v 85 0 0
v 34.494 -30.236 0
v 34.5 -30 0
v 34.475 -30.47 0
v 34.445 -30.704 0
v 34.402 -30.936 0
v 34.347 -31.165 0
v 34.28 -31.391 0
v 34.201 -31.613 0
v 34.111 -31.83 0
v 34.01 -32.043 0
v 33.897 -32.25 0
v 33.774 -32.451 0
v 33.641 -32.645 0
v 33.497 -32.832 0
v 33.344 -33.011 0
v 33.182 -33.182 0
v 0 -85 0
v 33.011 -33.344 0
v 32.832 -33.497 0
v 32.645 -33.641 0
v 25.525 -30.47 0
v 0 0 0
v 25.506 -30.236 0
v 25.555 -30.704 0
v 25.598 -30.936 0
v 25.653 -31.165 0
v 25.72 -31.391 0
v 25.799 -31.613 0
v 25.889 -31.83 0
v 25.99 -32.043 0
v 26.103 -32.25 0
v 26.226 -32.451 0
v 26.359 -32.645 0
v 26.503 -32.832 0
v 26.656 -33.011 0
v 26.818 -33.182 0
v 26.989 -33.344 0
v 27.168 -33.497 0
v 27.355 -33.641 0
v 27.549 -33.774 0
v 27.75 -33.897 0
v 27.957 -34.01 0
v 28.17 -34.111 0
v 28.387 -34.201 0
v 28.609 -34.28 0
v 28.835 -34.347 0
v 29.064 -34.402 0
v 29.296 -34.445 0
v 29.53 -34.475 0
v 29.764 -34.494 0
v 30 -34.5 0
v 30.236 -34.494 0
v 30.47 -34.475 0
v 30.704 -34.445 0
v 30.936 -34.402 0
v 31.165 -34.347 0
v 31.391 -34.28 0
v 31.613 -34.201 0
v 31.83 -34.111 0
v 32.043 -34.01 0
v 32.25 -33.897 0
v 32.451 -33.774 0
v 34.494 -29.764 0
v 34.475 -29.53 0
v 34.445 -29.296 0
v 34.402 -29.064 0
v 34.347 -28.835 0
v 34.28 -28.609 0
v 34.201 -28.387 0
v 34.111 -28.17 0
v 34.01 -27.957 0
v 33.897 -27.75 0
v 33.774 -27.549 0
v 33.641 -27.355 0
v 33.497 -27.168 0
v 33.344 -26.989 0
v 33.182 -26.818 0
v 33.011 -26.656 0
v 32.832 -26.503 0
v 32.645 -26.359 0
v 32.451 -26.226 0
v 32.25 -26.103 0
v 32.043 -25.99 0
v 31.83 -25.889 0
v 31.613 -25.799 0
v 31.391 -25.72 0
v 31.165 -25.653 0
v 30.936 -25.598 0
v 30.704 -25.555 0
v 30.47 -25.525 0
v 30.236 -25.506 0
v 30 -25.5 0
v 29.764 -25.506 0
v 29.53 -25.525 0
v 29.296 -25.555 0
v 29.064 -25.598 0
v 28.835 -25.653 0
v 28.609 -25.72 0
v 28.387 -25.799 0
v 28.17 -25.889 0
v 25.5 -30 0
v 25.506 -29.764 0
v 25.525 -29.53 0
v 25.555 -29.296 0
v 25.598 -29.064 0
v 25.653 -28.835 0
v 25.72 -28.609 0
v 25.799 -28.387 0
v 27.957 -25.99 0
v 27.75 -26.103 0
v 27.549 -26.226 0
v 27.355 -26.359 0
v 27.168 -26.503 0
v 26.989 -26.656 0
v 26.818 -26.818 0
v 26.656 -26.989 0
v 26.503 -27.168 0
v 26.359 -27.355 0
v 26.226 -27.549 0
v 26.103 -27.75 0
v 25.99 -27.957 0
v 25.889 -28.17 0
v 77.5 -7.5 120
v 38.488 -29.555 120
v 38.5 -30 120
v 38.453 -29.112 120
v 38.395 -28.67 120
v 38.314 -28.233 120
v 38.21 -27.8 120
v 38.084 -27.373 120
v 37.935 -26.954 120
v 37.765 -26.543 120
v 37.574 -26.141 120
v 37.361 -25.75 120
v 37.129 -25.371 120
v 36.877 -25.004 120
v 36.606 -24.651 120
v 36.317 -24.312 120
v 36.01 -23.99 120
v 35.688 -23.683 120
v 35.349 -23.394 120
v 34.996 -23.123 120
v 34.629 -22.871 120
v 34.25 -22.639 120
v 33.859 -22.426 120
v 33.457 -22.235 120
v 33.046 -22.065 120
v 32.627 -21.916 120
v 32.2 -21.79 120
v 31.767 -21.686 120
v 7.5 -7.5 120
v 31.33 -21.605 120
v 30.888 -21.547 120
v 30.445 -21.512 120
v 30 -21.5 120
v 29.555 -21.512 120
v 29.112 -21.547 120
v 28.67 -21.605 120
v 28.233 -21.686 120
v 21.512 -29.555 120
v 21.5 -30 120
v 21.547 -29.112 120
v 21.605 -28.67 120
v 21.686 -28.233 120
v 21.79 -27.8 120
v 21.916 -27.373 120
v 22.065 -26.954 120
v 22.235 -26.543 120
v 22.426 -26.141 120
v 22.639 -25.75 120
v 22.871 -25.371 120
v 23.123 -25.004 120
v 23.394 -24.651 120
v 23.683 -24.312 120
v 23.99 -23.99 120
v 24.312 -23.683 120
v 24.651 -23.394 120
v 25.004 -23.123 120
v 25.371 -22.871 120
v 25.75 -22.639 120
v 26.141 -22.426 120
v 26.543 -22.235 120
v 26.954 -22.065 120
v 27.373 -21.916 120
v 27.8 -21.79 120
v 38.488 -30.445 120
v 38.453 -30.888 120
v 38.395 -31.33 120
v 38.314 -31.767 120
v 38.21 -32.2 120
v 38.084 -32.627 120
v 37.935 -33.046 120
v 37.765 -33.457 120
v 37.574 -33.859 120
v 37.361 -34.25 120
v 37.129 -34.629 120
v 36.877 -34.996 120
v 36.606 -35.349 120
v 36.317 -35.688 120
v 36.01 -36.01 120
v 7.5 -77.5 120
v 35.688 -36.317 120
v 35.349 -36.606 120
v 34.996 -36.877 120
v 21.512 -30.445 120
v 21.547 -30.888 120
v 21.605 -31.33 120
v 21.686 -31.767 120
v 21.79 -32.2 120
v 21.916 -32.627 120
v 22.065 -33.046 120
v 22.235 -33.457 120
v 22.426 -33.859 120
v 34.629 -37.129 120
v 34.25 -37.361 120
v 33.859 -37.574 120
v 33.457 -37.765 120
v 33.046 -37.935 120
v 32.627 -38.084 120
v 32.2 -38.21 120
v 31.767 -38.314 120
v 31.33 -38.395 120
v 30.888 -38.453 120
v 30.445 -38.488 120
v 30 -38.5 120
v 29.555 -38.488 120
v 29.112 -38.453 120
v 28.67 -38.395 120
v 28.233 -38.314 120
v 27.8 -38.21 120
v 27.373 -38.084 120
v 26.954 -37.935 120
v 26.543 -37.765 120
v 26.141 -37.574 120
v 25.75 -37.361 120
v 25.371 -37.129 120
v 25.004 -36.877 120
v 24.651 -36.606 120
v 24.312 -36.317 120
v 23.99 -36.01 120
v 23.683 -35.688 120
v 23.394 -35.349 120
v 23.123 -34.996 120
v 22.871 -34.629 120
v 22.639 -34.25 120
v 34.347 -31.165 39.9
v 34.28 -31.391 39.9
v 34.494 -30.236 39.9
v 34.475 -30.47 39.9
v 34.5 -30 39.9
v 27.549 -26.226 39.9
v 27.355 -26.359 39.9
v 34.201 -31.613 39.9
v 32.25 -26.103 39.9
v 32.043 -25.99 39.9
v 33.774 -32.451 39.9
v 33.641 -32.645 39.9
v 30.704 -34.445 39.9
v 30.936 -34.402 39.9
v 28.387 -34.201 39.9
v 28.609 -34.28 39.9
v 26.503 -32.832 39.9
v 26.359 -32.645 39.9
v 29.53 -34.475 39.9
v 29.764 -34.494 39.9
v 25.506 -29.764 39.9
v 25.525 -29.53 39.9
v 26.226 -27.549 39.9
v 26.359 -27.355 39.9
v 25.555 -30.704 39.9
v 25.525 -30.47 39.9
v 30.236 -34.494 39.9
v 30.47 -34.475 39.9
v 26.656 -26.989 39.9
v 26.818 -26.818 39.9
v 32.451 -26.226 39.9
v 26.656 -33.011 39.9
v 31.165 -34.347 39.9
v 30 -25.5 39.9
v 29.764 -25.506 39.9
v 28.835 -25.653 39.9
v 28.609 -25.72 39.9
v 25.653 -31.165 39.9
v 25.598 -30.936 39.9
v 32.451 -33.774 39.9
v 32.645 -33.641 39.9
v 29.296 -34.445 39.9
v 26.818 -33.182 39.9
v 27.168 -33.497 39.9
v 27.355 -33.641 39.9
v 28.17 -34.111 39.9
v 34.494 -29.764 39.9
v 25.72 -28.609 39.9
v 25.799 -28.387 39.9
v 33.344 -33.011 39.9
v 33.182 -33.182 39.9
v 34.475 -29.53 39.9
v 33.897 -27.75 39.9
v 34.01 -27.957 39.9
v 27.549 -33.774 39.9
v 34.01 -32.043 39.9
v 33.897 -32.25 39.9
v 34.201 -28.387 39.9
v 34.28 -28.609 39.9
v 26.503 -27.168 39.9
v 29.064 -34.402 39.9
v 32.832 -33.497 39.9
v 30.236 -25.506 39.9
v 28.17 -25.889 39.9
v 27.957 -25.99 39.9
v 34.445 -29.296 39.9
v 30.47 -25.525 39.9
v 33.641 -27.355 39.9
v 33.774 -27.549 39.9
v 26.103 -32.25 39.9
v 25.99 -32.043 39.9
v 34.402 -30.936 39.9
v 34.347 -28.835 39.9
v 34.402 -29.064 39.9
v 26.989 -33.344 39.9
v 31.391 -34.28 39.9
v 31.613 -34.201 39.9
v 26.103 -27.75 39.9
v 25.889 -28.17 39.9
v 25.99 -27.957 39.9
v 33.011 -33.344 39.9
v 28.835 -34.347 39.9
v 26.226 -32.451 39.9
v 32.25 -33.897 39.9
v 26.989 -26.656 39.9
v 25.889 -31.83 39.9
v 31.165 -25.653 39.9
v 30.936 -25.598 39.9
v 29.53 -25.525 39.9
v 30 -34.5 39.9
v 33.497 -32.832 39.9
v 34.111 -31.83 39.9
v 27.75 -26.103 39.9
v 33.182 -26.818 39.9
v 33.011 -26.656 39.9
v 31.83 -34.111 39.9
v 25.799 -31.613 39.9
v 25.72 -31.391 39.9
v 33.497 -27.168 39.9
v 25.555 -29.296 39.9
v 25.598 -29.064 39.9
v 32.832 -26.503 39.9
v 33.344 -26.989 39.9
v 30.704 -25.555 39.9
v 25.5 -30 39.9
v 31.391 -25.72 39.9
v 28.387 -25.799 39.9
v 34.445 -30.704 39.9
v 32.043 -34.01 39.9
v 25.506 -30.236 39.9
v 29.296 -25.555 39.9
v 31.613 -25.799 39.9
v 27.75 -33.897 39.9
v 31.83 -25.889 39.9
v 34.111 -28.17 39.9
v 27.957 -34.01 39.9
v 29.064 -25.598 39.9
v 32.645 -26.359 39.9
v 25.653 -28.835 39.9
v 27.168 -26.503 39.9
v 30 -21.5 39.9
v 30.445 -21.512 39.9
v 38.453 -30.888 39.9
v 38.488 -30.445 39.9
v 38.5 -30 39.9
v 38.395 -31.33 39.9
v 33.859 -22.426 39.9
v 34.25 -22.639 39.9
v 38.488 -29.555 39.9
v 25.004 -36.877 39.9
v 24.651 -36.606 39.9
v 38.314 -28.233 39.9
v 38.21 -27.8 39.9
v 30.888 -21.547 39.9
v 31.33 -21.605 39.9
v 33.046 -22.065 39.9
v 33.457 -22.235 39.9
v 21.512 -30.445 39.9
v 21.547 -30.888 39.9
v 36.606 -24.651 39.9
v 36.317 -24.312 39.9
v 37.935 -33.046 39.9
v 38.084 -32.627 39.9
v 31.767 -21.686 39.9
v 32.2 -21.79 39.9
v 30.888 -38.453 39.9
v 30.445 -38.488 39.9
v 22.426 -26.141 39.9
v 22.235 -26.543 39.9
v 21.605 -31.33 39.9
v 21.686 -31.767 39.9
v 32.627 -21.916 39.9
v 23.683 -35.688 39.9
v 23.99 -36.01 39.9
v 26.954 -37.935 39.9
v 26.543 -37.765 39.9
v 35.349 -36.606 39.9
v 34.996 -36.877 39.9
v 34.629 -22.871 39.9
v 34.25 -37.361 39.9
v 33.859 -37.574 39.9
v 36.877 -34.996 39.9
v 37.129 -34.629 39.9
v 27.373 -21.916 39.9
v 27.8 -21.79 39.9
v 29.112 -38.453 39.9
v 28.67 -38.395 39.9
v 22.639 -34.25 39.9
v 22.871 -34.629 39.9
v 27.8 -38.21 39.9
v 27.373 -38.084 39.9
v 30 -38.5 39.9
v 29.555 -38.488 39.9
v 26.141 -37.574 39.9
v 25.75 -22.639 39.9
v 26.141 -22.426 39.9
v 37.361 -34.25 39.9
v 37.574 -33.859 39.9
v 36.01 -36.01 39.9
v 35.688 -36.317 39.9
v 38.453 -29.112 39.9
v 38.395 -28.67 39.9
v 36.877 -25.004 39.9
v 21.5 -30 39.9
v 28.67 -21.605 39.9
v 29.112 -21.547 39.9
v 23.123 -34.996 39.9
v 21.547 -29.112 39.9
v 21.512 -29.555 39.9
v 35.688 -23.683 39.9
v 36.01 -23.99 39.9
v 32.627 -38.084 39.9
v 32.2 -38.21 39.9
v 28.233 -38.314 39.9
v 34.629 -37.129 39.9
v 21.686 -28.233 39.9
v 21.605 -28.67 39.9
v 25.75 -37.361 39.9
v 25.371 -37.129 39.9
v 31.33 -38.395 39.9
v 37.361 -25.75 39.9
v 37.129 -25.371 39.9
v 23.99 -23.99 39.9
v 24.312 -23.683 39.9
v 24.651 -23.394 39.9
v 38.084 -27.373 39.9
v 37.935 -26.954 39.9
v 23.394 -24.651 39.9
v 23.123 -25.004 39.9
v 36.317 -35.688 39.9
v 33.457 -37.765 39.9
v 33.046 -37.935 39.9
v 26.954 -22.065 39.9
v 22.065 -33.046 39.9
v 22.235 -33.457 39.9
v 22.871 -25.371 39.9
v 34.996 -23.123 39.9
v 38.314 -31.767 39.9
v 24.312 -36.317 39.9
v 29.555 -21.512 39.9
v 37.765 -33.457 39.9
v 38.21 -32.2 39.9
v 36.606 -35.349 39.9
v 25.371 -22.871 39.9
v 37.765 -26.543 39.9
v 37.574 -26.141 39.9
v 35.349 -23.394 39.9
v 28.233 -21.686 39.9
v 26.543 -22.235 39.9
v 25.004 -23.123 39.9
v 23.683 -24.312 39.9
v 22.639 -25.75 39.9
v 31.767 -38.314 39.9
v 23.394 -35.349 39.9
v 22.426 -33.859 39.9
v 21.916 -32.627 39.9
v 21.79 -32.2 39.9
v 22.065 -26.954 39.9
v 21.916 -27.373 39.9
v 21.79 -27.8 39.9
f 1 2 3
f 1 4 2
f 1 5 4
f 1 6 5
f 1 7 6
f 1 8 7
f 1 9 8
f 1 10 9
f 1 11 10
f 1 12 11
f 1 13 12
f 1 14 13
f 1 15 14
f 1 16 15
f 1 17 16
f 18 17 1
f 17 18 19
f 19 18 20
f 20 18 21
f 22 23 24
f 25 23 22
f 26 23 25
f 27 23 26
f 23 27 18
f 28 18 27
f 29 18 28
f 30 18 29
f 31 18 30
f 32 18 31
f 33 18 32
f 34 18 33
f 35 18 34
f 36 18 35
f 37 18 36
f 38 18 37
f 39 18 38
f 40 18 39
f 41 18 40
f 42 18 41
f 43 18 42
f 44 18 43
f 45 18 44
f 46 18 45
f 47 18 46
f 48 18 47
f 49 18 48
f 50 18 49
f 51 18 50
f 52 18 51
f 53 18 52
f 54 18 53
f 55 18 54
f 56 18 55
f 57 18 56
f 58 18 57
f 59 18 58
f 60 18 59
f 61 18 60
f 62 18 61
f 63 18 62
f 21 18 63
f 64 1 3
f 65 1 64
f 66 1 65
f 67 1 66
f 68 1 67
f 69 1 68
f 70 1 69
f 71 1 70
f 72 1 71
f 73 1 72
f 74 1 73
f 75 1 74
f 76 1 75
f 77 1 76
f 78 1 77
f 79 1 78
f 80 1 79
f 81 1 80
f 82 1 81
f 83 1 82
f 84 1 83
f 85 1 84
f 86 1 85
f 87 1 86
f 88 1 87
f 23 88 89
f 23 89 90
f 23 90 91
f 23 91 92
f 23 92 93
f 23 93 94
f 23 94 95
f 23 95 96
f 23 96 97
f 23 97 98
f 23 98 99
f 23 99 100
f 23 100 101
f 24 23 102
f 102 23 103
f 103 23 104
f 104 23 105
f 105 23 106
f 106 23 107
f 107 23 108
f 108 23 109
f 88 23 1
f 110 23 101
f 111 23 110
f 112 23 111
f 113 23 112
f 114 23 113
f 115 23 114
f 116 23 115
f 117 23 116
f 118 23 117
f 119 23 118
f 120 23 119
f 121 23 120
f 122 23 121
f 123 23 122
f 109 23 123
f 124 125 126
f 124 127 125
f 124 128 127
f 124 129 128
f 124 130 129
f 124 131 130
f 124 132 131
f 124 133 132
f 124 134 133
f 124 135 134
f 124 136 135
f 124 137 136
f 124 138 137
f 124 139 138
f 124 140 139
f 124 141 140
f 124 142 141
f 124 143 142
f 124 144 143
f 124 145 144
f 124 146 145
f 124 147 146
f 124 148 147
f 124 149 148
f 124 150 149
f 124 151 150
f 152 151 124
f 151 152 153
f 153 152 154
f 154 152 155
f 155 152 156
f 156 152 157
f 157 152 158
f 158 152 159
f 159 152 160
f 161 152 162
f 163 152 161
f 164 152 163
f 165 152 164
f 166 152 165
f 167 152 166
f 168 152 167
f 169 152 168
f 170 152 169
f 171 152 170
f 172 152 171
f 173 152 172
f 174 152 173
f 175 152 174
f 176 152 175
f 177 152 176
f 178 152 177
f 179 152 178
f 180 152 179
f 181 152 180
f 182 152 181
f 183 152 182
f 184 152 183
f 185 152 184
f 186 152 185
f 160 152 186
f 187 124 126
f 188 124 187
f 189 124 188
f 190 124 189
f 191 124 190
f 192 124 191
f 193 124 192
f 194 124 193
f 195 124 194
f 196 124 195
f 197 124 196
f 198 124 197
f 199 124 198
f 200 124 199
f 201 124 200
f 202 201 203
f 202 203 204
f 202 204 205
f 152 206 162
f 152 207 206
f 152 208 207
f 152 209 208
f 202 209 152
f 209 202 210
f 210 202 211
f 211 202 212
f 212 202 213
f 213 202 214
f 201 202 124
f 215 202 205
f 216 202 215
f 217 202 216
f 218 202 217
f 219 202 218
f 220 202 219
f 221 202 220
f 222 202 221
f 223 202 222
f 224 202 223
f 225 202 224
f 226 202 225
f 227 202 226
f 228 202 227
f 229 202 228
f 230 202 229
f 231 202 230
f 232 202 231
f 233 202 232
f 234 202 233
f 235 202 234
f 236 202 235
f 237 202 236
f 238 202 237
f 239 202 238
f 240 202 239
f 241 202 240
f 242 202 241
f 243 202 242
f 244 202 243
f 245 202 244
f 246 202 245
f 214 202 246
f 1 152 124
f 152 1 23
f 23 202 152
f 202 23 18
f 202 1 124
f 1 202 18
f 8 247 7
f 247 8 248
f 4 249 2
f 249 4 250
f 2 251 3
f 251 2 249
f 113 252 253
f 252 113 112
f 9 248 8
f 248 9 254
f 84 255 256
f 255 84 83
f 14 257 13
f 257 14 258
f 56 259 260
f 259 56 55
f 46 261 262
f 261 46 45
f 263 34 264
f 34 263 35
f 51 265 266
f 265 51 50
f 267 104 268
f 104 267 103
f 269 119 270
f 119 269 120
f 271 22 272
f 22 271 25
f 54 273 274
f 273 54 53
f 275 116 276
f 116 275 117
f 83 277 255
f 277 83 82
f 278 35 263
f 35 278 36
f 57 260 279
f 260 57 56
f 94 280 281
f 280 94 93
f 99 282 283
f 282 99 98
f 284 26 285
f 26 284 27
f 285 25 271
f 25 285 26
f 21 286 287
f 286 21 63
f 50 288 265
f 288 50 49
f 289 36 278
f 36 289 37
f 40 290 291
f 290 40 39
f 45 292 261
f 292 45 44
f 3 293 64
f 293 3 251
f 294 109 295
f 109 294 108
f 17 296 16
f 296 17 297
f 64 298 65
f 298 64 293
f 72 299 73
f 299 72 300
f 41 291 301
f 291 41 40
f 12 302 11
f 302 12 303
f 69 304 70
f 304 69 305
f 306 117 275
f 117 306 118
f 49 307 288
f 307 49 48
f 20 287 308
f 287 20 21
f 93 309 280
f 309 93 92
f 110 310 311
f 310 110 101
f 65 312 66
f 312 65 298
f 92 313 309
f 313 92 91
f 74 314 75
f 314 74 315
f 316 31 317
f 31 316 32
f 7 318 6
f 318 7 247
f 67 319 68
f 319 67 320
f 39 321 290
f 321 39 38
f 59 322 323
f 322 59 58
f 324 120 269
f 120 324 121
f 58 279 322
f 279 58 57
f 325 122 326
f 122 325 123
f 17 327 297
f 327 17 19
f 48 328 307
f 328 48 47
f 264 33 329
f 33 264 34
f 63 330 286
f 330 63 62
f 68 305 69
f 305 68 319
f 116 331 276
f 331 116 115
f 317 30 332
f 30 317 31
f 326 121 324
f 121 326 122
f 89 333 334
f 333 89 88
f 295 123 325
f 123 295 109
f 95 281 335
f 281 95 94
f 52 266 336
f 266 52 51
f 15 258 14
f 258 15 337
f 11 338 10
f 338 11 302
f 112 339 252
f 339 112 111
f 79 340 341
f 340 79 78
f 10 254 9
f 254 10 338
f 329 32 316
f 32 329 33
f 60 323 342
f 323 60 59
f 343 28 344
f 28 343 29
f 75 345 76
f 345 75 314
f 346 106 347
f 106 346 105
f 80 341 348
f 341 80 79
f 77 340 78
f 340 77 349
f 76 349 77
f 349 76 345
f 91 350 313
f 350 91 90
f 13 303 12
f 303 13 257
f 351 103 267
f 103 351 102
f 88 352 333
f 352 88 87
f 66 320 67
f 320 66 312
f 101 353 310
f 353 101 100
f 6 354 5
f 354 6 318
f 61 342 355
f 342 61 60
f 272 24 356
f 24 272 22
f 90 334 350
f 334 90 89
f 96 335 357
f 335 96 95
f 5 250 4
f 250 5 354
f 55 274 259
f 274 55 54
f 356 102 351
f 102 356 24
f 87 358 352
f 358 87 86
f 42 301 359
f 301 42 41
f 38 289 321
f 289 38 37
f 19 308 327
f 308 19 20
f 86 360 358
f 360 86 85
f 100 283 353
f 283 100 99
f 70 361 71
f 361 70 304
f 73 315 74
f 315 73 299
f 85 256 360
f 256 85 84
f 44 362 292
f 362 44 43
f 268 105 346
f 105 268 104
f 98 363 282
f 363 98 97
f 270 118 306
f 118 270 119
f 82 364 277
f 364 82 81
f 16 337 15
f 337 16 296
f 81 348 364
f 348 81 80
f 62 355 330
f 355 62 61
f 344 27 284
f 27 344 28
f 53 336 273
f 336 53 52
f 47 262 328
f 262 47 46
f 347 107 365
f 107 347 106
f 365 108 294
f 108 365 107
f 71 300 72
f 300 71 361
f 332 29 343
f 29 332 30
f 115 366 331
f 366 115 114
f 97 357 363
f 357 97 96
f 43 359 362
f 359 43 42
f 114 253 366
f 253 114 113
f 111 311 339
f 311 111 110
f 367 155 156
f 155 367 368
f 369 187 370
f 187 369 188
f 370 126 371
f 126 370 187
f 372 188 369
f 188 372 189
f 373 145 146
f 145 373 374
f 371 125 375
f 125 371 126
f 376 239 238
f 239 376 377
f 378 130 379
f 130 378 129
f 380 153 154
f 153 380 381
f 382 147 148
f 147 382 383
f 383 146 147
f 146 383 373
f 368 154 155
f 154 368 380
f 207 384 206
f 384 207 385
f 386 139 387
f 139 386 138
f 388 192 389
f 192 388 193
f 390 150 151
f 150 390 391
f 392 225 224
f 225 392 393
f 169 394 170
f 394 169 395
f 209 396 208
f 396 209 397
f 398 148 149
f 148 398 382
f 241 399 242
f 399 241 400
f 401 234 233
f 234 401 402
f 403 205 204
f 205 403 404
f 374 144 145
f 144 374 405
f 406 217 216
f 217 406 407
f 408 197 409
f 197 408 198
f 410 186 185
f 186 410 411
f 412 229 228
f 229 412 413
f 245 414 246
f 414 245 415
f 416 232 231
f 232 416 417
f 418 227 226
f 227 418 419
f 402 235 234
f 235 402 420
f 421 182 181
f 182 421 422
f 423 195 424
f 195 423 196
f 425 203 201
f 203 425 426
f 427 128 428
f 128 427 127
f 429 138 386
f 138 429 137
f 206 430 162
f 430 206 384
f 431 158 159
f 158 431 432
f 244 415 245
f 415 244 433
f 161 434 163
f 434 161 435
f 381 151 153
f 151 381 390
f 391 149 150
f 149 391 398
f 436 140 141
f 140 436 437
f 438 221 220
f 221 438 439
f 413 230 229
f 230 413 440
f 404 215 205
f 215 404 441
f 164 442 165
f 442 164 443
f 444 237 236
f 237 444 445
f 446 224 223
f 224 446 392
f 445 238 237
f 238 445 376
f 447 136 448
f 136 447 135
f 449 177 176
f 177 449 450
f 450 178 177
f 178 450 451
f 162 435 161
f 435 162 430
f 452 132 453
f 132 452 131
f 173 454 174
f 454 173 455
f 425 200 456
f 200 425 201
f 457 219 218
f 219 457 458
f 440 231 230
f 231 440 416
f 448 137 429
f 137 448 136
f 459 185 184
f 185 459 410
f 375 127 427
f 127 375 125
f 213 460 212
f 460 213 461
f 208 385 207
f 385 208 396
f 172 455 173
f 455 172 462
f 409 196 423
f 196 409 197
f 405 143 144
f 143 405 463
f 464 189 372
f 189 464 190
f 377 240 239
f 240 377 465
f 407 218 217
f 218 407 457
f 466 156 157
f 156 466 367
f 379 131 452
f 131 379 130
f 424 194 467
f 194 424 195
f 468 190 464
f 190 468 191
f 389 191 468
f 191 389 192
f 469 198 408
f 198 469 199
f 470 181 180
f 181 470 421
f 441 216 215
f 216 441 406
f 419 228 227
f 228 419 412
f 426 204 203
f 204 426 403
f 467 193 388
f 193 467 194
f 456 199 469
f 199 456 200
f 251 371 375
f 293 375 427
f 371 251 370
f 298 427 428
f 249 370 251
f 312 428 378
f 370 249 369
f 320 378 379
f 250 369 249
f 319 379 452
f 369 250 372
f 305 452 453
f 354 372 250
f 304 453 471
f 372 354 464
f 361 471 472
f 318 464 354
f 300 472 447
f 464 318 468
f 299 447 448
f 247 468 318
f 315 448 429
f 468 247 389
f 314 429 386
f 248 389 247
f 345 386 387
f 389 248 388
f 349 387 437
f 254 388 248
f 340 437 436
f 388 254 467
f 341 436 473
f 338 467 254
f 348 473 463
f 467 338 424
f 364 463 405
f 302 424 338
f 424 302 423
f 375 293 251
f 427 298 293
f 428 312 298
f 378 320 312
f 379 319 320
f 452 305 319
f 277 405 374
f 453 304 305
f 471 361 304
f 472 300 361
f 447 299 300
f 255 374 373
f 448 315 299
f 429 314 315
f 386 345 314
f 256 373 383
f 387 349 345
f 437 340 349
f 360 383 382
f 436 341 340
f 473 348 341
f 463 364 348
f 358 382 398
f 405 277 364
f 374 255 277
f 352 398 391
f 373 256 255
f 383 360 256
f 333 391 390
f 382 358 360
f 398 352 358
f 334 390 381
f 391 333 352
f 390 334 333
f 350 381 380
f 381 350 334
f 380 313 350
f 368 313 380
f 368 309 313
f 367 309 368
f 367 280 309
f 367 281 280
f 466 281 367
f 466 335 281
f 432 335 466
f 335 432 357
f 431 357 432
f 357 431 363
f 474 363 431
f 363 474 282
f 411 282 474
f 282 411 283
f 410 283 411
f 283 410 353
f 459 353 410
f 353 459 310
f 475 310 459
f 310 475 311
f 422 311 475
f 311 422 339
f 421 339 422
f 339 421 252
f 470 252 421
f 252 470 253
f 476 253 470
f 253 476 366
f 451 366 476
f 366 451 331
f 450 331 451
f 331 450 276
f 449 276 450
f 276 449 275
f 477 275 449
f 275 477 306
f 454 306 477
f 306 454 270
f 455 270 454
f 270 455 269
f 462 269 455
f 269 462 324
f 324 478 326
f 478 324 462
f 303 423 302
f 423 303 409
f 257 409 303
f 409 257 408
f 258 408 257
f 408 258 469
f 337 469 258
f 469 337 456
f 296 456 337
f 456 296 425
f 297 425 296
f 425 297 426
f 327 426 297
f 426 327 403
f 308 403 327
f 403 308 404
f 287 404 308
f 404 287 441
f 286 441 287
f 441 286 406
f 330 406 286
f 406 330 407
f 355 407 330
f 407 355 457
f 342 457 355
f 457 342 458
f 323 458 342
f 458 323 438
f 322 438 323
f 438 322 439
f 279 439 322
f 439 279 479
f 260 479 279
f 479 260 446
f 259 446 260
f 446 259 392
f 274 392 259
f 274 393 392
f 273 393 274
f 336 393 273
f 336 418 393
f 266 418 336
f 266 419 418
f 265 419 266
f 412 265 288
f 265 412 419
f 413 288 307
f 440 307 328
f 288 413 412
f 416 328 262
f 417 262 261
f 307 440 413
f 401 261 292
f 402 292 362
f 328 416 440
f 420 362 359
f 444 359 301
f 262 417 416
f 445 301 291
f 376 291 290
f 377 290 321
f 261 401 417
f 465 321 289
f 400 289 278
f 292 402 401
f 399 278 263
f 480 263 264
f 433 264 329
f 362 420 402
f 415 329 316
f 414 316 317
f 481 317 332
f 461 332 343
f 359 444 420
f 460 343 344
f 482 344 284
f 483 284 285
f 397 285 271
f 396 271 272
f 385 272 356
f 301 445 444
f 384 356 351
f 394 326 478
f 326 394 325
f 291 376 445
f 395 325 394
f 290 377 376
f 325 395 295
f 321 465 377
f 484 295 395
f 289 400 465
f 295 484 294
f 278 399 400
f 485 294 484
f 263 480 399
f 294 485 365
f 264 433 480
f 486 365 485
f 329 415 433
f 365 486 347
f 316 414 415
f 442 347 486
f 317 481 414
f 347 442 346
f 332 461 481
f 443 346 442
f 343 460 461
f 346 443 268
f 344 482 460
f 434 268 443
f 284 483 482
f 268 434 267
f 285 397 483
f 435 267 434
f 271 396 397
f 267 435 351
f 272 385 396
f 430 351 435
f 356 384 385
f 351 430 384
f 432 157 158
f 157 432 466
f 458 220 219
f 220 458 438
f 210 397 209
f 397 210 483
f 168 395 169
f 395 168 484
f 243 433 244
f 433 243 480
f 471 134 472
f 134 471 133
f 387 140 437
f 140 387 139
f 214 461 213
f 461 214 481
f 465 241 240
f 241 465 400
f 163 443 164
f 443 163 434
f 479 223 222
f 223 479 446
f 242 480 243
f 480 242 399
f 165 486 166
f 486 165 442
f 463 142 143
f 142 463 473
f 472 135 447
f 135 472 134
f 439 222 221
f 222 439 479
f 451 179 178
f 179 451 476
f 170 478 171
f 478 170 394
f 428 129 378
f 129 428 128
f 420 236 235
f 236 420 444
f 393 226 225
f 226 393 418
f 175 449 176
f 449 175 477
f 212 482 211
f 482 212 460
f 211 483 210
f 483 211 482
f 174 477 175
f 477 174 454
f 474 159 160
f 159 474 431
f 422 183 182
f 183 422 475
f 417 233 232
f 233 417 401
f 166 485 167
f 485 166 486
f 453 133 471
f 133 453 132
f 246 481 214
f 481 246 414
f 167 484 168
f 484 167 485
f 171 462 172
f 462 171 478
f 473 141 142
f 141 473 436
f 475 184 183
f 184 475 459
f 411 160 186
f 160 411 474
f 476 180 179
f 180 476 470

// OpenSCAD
$fn=120;
pad=0.1;
top_w=85;
bottom_w=70;
height=120;
delta=(top_w-bottom_w)/2;
angle=atan(delta/height);
hole_w=30;
hole_d=9;
hole_r=hole_d/2;
bolt_grip=40;

head_d=17;
head_r=head_d/2;

translate([0,0,height])
rotate([180,0,0])
difference(){
	cube([top_w,top_w,height]);

	translate([0,0,height])
	rotate([180+angle,0,0])
	cube([top_w+pad,top_w+pad,height*2]);

	translate([0,0,height])
	rotate([0,180-angle,0])
	cube([top_w+pad,top_w+pad,height*2]);

	translate([top_w,0,-pad])
	rotate([0,0,45])
	cube([top_w*2,top_w*2,height+2*pad]);
	
	translate([hole_w,hole_w,-pad])
	cylinder(r=hole_r,h=height+2*pad);

	translate([hole_w,hole_w,-pad])
	cylinder(r=head_r,h=height+2*pad-bolt_grip);
}
